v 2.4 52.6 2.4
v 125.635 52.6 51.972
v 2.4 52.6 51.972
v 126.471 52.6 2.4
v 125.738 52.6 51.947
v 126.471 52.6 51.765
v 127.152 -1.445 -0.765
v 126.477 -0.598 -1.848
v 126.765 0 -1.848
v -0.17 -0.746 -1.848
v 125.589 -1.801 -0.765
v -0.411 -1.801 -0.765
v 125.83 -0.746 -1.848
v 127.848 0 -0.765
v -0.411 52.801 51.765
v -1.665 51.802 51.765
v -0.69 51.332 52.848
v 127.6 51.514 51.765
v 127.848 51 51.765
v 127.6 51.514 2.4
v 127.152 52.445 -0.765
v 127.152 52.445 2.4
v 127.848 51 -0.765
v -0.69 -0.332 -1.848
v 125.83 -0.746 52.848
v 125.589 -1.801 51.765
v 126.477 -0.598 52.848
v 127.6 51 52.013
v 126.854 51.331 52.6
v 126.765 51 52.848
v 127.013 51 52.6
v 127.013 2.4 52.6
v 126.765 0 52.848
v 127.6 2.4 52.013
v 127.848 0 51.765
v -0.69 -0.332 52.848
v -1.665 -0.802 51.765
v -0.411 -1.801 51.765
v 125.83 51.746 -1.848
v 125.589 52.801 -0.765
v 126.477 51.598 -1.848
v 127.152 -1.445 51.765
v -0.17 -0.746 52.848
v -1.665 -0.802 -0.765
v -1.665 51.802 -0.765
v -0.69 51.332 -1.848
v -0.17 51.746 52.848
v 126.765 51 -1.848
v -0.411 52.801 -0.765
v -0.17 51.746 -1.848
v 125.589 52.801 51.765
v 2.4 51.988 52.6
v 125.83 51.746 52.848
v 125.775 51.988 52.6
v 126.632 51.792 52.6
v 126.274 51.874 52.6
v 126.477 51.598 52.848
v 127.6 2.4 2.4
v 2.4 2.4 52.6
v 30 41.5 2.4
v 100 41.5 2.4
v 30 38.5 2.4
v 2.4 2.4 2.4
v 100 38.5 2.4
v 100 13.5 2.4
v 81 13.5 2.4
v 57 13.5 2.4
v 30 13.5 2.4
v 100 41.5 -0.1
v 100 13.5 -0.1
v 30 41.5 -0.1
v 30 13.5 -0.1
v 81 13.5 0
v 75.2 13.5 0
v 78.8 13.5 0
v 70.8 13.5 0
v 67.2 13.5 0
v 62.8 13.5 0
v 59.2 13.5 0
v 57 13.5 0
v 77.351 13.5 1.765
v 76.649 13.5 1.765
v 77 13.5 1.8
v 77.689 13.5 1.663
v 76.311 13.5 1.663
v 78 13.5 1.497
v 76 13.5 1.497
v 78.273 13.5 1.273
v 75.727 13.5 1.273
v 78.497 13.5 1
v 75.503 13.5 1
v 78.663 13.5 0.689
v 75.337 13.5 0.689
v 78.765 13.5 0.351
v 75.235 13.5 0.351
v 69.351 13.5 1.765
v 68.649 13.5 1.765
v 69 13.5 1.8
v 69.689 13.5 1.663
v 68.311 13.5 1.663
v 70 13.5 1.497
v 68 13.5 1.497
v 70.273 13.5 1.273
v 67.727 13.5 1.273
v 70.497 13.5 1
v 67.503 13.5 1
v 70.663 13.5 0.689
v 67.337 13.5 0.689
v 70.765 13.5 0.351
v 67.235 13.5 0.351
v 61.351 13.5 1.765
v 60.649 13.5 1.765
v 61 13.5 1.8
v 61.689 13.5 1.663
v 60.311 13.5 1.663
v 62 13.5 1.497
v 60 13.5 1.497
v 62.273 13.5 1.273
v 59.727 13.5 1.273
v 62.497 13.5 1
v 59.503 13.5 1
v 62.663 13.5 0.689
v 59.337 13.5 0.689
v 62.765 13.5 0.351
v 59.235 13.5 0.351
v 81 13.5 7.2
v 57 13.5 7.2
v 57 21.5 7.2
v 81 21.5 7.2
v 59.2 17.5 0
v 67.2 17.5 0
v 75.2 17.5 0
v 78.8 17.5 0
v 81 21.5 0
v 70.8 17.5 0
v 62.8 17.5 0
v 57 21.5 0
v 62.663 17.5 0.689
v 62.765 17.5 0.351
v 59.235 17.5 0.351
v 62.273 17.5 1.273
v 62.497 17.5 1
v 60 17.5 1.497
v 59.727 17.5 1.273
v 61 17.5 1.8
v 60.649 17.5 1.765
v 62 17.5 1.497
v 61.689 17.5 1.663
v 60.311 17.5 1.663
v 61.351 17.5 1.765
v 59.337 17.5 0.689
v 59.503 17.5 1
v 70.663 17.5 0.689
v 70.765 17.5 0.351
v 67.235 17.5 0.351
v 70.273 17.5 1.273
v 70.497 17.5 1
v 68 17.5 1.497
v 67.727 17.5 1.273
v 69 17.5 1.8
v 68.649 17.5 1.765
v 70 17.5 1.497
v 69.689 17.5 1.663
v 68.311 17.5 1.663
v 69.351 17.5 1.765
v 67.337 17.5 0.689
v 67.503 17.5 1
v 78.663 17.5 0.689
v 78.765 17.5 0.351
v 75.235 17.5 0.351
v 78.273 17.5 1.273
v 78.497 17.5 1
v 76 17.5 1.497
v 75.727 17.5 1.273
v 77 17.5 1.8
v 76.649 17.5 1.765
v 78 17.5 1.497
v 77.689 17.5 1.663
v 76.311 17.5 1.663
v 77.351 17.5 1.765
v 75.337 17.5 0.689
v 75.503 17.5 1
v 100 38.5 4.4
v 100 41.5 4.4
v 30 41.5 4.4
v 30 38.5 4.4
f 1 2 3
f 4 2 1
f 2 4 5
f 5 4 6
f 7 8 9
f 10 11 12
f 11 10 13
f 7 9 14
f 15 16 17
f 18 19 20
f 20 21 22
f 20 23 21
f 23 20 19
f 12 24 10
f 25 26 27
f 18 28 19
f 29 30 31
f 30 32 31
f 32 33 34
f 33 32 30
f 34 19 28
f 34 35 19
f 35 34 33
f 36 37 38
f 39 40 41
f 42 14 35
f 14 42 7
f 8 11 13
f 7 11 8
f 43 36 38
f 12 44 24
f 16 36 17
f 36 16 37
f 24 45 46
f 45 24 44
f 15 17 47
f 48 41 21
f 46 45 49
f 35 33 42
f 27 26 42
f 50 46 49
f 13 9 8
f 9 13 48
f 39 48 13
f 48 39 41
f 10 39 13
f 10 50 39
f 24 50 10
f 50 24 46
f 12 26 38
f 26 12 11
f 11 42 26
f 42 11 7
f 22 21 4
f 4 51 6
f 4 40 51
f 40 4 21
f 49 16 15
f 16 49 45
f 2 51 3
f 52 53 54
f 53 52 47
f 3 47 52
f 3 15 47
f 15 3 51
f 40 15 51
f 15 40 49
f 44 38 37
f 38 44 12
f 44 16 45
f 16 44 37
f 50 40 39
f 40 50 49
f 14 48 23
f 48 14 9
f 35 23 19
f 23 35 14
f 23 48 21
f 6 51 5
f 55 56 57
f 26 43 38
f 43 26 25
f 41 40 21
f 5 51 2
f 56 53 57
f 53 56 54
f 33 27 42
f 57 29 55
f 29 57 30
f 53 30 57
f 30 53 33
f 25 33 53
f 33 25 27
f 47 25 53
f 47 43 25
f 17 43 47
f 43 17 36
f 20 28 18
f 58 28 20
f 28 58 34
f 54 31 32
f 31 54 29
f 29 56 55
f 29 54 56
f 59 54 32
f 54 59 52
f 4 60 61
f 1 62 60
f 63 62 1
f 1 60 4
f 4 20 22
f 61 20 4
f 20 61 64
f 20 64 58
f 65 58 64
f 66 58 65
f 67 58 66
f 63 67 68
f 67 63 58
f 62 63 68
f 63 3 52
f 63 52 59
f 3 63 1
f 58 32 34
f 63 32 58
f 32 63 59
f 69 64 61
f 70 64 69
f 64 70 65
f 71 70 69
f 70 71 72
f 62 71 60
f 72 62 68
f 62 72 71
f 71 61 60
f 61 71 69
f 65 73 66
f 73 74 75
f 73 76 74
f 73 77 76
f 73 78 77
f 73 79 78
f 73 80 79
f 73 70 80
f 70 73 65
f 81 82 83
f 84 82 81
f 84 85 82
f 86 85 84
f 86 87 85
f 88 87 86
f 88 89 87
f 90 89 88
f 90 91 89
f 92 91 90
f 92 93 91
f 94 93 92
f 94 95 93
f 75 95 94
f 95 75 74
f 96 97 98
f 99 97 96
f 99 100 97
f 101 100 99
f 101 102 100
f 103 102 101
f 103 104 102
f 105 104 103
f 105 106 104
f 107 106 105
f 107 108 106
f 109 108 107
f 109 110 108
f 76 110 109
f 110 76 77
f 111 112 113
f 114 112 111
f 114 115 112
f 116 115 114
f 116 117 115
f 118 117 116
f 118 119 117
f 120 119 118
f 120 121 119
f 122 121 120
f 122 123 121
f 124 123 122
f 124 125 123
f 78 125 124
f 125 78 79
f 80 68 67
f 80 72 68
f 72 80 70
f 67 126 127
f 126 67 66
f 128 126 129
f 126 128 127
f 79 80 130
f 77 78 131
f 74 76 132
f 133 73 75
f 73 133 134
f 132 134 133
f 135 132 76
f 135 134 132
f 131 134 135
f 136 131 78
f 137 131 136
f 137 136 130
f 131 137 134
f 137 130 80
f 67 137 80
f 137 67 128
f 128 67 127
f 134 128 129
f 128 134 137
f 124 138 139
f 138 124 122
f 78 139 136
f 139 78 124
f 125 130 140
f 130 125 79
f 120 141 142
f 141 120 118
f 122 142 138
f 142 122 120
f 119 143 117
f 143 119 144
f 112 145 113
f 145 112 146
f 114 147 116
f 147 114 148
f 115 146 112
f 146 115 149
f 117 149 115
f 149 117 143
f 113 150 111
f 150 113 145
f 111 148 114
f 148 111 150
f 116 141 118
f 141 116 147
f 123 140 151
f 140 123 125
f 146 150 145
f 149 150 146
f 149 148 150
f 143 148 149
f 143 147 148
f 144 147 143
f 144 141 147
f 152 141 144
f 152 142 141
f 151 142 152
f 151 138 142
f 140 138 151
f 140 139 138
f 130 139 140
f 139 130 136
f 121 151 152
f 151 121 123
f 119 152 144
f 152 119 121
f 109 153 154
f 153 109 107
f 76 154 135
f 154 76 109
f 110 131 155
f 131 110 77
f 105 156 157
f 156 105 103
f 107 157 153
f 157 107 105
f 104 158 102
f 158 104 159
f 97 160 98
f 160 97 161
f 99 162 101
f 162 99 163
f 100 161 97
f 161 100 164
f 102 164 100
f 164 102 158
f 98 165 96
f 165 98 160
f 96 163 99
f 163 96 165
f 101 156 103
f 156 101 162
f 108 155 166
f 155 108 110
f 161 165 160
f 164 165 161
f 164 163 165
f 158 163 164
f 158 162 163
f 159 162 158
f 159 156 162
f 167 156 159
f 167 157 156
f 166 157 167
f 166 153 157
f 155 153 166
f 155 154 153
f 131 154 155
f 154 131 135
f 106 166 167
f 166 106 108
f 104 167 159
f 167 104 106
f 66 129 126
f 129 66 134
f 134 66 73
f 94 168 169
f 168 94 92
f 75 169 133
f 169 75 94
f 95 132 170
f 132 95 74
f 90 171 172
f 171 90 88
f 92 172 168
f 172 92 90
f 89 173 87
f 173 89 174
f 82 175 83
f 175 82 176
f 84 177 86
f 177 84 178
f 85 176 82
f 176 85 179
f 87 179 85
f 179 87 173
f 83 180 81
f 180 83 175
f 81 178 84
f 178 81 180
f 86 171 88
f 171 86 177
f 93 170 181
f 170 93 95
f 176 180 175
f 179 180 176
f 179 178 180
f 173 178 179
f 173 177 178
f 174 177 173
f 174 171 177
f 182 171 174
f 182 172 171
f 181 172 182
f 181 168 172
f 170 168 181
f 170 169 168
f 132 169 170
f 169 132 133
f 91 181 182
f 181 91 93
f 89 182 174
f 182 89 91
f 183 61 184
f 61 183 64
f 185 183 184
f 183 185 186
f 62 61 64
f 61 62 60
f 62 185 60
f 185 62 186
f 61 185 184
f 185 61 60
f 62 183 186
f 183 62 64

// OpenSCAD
// Celebration Confetti Dropper - OpenSCAD
// Parametric, split for 200x200mm print beds

part = "left_body"; // left_body, right_body, lid_left, lid_right, gate, alignment_pin, servo_horn_adapter

// Global parameters
body_length = 260; // mm
body_width = 55;
body_height = 55;
wall = 2.4;

half_length = body_length / 2;

chute_length = 70;
chute_width = 28;

magnet_d = 10.2;
magnet_depth = 3.2;
magnet_rows = 2;
magnet_cols = 2;

m3_clear = 3.4;
m3_pilot = 2.8;

alignment_pin_d = 5;
alignment_pin_l = 12;

hinge_pin_d = 3.2; // use 3mm filament or rod
hinge_knuckle_len = 8;

servo_bay_l = 26;
servo_bay_w = 13;
servo_bay_h = 23;
servo_bay_offset = 20; // from left end

lip_height = 2.0;
lid_thickness = 2.0;

// Helper modules
module rounded_cube(size, r=2) {
  minkowski() {
    cube([size[0]-2*r, size[1]-2*r, size[2]-2*r]);
    sphere(r);
  }
}

module magnet_pockets(half_len) {
  pocket_x = [half_len * 0.25, half_len * 0.75];
  pocket_z = [body_height * 0.25, body_height * 0.75];
  for (x = pocket_x) {
    for (z = pocket_z) {
      translate([x, body_width - wall, z])
        rotate([90, 0, 0])
          cylinder(d = magnet_d, h = magnet_depth, $fn = 48);
    }
  }
}

module screw_bosses(half_len, is_left=true) {
  boss_positions = [
    [half_len - 12, 12, body_height * 0.3],
    [half_len - 12, body_width - 12, body_height * 0.3],
    [half_len - 12, 12, body_height * 0.7],
    [half_len - 12, body_width - 12, body_height * 0.7]
  ];
  for (p = boss_positions) {
    translate(p)
      rotate([0, 90, 0])
        cylinder(d = is_left ? m3_clear : m3_pilot, h = wall * 2, $fn = 32);
  }
}

module alignment_pin_holes(half_len, is_left=true) {
  pin_positions = [
    [half_len - 20, body_width * 0.35, body_height * 0.5],
    [half_len - 20, body_width * 0.65, body_height * 0.5]
  ];
  for (p = pin_positions) {
    translate(p)
      rotate([0, 90, 0])
        cylinder(d = is_left ? alignment_pin_d + 0.3 : alignment_pin_d - 0.2,
                 h = wall * 2, $fn = 32);
  }
}

module hinge_mounts(x_offset) {
  knuckle_positions = [
    x_offset + (chute_length / 2) - hinge_knuckle_len,
    x_offset + (chute_length / 2),
    x_offset + (chute_length / 2) + hinge_knuckle_len
  ];
  for (kx = knuckle_positions) {
    difference() {
      translate([kx, (body_width - chute_width) / 2, 0])
        cube([hinge_knuckle_len, hinge_knuckle_len, hinge_pin_d + 4]);
      translate([kx + hinge_knuckle_len / 2, (body_width - chute_width) / 2 + hinge_knuckle_len / 2, 0])
        rotate([90, 0, 0])
          cylinder(d = hinge_pin_d + 0.4, h = hinge_knuckle_len + 1, $fn = 32);
    }
  }
}

module body_half(is_left=true) {
  half_len = body_length / 2;
  x_offset = is_left ? 0 : 0;

  difference() {
    rounded_cube([half_len, body_width, body_height], r=2);

    // Hollow interior
    translate([wall, wall, wall])
      cube([half_len - 2*wall, body_width - 2*wall, body_height - 2*wall]);

    // Chute aperture
    translate([
      (half_len - chute_length) / 2,
      (body_width - chute_width) / 2,
      -0.1
    ])
      cube([chute_length, chute_width, wall + 0.2]);

    // Servo bay (left half only)
    if (is_left) {
      translate([servo_bay_offset, wall, body_height - servo_bay_h - wall])
        cube([servo_bay_l, servo_bay_w, servo_bay_h]);
    }

    // Magnet pockets (rear face)
    magnet_pockets(half_len);

    // Screw holes and alignment pins on split face
    screw_bosses(half_len, is_left);
    alignment_pin_holes(half_len, is_left);
  }

  // Hinge mounts on bottom edge (one side of chute)
  hinge_mounts((half_len - chute_length) / 2);

  // Gate stop ridge
  translate([
    (half_len - chute_length) / 2,
    (body_width - chute_width) / 2 + chute_width - 3,
    wall
  ])
    cube([chute_length, 3, 2]);
}

module lid_half(is_left=true) {
  half_len = body_length / 2;
  difference() {
    cube([half_len, body_width, lid_thickness]);
    // screw clearance to align with bosses
    screw_bosses(half_len, true);
  }
  // lip to reduce spill
  translate([wall, wall, lid_thickness])
    cube([half_len - 2*wall, body_width - 2*wall, lip_height]);
}

module gate_flap() {
  flap_len = chute_length + 6;
  flap_w = chute_width + 6;
  flap_t = 2.4;

  // main plate
  cube([flap_len, flap_w, flap_t]);

  // hinge barrel along one long edge
  translate([0, 0, flap_t])
    difference() {
      rotate([0, 90, 0])
        cylinder(d = hinge_pin_d + 4, h = flap_len, $fn = 32);
      rotate([0, 90, 0])
        cylinder(d = hinge_pin_d + 0.4, h = flap_len + 0.2, $fn = 32);
    }

  // pusher tab near servo side
  translate([flap_len - 10, flap_w / 2 - 3, flap_t])
    cube([8, 6, 6]);
}

module alignment_pin() {
  cylinder(d = alignment_pin_d, h = alignment_pin_l, $fn = 32);
}

module servo_horn_adapter() {
  // simple adapter for SG90 horn
  difference() {
    cylinder(d = 12, h = 4, $fn = 48);
    cylinder(d = 2.2, h = 5, $fn = 24);
  }
}

if (part == "left_body") {
  body_half(true);
} else if (part == "right_body") {
  body_half(false);
} else if (part == "lid_left") {
  lid_half(true);
} else if (part == "lid_right") {
  lid_half(false);
} else if (part == "gate") {
  gate_flap();
} else if (part == "alignment_pin") {
  alignment_pin();
} else if (part == "servo_horn_adapter") {
  servo_horn_adapter();
}
